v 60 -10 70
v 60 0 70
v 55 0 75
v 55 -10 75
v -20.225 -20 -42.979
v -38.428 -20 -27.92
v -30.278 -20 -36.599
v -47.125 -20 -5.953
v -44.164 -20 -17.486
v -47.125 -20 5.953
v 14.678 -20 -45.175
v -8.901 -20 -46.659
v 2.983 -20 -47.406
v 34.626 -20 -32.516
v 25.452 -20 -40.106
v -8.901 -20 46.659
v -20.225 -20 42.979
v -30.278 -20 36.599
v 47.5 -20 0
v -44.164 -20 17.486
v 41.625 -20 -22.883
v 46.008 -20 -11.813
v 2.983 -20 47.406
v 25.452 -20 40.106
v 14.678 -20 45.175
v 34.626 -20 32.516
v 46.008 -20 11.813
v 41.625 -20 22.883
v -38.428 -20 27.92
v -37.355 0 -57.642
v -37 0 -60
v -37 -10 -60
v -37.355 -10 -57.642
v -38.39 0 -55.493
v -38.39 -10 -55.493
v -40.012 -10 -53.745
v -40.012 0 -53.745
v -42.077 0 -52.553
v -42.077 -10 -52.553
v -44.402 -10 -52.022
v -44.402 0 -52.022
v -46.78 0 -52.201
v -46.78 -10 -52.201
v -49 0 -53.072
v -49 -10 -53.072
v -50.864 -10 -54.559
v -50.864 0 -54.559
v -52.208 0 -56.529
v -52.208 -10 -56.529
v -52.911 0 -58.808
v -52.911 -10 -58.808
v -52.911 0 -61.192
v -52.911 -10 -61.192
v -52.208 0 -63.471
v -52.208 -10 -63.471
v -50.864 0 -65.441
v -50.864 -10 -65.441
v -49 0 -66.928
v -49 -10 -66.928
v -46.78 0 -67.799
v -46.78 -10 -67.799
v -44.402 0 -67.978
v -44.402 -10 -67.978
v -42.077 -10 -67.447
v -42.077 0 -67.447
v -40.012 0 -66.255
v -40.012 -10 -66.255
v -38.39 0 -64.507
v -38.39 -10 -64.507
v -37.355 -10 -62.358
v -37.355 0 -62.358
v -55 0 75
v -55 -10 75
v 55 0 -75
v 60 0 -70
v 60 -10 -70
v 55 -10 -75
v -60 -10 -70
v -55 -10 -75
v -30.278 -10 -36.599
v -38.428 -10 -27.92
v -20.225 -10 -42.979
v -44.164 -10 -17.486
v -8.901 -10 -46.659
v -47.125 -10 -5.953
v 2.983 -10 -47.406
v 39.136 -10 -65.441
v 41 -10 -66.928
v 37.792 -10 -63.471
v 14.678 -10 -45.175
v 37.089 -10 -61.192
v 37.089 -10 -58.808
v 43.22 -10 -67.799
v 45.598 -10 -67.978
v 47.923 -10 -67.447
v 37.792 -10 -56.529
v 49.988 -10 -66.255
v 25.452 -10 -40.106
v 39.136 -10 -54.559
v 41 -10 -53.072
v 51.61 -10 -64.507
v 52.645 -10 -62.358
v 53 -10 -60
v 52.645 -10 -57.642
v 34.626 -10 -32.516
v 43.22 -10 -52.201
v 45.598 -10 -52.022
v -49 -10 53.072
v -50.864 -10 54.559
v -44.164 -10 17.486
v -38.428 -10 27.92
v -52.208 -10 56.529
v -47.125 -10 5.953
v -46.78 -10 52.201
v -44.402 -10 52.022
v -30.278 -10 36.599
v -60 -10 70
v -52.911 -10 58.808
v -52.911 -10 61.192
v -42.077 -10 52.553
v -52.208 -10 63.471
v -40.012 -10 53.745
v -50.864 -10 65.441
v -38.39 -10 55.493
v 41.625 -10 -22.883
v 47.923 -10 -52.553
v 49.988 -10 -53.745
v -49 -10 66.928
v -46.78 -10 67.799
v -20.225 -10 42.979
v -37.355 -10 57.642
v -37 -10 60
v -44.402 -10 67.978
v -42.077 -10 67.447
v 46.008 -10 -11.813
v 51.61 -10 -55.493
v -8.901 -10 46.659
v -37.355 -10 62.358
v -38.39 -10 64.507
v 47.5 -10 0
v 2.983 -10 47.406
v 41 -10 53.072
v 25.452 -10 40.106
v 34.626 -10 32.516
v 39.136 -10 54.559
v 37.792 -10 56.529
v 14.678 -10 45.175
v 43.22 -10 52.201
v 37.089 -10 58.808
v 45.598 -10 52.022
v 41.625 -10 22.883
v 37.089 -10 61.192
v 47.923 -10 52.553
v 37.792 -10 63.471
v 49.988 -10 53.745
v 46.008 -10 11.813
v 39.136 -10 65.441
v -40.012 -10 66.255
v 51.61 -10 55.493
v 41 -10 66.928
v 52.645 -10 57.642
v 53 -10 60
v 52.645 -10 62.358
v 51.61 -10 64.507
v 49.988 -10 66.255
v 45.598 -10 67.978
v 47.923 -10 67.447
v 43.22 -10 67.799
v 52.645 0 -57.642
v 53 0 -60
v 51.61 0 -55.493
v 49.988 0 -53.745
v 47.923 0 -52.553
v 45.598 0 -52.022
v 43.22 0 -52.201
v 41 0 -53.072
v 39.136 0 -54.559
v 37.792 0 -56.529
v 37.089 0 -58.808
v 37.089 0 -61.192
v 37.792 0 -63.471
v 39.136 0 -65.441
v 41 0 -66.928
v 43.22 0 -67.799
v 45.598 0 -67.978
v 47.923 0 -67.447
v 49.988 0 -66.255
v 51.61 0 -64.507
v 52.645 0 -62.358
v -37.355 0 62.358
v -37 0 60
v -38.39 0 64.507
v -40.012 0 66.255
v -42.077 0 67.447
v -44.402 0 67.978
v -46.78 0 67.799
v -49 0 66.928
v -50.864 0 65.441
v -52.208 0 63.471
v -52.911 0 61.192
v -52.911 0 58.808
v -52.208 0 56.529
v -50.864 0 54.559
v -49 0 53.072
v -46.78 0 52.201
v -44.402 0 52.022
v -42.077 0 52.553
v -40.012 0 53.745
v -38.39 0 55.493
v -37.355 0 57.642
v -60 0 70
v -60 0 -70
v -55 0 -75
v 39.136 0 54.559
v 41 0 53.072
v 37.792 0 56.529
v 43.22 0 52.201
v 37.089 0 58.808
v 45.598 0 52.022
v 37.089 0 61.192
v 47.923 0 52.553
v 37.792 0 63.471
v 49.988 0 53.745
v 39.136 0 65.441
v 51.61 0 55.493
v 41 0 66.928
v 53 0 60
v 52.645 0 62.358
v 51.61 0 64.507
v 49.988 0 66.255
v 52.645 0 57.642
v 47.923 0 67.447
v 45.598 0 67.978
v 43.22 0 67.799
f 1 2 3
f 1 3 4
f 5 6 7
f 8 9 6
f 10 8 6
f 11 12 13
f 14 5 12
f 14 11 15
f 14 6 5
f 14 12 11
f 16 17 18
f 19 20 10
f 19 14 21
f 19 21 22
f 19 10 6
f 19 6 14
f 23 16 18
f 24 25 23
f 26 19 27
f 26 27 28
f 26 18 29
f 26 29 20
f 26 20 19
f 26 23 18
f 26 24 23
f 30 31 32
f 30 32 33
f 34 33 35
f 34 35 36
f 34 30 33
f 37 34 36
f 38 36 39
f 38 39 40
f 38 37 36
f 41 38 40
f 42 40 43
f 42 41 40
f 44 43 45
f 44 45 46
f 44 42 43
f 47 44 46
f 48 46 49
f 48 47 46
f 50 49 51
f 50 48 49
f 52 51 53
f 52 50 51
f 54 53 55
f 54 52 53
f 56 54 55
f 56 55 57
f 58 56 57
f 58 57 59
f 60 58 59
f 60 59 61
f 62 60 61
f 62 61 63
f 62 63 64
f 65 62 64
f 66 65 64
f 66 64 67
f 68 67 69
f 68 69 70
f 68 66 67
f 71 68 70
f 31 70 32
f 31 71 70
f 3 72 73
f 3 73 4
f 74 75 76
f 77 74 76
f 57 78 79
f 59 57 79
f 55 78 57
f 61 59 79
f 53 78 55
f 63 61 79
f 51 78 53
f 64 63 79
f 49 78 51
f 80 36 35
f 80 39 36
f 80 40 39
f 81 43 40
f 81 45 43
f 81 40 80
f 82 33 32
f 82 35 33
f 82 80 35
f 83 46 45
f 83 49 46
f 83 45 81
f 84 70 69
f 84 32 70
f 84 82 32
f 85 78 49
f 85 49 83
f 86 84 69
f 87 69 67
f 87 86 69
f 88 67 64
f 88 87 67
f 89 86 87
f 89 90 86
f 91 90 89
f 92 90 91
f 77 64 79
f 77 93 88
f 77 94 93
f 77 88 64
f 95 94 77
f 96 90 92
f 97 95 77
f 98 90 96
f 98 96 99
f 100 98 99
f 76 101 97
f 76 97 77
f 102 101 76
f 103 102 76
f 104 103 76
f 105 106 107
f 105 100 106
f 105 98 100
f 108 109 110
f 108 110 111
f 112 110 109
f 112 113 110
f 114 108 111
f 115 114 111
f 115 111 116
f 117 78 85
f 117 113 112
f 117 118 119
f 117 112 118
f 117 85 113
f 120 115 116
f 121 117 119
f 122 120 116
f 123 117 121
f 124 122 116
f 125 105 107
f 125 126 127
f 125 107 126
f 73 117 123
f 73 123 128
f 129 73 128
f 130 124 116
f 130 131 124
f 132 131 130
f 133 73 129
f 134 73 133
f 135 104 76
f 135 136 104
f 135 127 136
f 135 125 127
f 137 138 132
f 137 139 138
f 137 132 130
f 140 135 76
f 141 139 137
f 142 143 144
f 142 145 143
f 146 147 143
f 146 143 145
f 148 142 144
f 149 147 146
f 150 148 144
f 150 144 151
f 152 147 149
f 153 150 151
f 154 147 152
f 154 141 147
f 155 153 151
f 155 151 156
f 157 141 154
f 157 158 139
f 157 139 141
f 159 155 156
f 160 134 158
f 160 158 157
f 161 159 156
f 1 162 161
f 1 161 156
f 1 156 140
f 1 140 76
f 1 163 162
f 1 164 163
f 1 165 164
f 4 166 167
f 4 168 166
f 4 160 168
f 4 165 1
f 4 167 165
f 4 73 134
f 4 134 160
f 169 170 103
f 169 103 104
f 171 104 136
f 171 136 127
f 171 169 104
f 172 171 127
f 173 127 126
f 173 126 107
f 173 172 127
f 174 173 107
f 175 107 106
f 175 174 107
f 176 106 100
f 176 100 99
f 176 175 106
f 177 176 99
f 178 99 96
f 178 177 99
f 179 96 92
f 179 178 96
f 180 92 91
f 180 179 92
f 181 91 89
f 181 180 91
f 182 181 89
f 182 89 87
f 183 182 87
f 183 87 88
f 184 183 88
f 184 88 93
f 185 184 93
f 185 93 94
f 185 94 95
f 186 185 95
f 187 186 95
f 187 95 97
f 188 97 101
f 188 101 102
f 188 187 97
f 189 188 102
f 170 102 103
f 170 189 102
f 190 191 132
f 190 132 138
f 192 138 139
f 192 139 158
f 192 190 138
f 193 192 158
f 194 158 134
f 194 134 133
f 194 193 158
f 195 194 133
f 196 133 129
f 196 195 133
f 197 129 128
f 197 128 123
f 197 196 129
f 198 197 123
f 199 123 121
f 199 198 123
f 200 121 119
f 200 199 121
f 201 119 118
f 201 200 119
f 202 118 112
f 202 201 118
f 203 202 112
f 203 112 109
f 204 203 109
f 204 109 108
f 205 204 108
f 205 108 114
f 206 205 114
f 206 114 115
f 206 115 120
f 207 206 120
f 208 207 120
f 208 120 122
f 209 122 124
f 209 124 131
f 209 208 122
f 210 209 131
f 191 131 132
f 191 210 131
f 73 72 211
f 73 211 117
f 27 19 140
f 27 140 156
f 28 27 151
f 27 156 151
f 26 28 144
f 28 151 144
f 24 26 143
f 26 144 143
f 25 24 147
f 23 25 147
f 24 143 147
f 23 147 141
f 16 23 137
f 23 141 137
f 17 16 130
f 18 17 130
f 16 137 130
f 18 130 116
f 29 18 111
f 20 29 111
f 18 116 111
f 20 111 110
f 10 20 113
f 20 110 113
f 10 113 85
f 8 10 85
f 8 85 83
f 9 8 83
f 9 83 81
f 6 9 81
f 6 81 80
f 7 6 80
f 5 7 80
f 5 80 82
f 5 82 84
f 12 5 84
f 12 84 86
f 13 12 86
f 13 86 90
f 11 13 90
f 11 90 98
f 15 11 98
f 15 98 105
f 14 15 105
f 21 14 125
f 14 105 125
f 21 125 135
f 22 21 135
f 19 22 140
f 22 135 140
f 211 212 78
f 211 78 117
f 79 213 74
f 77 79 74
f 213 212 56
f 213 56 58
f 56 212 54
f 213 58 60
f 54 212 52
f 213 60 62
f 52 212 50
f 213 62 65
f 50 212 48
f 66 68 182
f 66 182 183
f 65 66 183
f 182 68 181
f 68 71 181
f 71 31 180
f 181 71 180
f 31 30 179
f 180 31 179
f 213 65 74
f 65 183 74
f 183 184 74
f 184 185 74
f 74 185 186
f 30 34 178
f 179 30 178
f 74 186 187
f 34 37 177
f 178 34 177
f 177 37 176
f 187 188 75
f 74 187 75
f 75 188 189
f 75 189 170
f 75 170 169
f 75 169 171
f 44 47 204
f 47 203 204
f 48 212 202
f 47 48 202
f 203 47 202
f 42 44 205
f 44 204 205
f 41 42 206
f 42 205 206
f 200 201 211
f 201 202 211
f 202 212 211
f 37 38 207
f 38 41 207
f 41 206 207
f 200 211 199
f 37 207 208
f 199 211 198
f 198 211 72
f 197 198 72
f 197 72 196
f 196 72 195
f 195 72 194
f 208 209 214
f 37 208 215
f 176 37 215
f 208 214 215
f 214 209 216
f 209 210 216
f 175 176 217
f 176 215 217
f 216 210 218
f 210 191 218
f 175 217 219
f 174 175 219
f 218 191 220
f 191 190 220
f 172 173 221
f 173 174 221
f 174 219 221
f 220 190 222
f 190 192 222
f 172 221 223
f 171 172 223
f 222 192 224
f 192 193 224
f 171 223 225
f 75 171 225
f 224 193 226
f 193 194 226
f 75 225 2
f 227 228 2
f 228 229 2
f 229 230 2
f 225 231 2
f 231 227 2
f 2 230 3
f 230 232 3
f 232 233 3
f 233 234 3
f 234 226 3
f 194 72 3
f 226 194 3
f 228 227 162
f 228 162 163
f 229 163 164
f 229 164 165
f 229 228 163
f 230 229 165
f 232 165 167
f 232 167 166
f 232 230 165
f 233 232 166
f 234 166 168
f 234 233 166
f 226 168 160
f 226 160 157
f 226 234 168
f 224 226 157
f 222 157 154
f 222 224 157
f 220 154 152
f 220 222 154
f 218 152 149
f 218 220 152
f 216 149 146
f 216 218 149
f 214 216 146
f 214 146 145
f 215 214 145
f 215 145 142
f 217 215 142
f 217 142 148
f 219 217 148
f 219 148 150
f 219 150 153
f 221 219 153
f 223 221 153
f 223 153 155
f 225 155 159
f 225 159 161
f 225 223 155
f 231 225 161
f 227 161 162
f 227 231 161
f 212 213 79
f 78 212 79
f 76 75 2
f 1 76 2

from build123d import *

# Parameters (mm, degrees)
F0_R      = 47.5
F0_R_2    = 35
F1_DEPTH  = 20
F0_W      = 120
F0_H      = 150
F0_R_3    = 8
F2_DEPTH  = 10
F2_FACE_R = 35
F3_DEPTH  = 10
F4_SIZE   = 5


with BuildPart() as f1:
    # F0 (on Front) → F1 (new body)
    with BuildSketch(Plane.XZ):
        Circle(F0_R)
        Circle(F0_R_2, mode=Mode.SUBTRACT)
    extrude(amount=F1_DEPTH)

    # F0 (on Front) → F2 (join)
    with BuildSketch(Plane.XZ):
        Rectangle(F0_W, F0_H)
        with Locations((-45, -60)):
            Circle(F0_R_3, mode=Mode.SUBTRACT)
        with Locations((45, -60)):
            Circle(F0_R_3, mode=Mode.SUBTRACT)
        with Locations((-45, 60)):
            Circle(F0_R_3, mode=Mode.SUBTRACT)
        Circle(F0_R, mode=Mode.SUBTRACT)
        with Locations((45, 60)):
            Circle(F0_R_3, mode=Mode.SUBTRACT)
        Circle(F0_R_2)
    extrude(amount=F2_DEPTH)

    # F2_face (on face) → F3 (join)
    with BuildSketch(Plane.XZ.offset(10)):
        Circle(F2_FACE_R)
    extrude(amount=F3_DEPTH)

    # F4
    f4_edges = [f1.edges().sort_by_distance(p)[0] for p in [
        (-60, -5, 75),
        (60, -5, 75),
        (60, -5, -75),
        (-60, -5, -75),
    ]]
    chamfer(f4_edges, length=F4_SIZE)


solid = f1.part
